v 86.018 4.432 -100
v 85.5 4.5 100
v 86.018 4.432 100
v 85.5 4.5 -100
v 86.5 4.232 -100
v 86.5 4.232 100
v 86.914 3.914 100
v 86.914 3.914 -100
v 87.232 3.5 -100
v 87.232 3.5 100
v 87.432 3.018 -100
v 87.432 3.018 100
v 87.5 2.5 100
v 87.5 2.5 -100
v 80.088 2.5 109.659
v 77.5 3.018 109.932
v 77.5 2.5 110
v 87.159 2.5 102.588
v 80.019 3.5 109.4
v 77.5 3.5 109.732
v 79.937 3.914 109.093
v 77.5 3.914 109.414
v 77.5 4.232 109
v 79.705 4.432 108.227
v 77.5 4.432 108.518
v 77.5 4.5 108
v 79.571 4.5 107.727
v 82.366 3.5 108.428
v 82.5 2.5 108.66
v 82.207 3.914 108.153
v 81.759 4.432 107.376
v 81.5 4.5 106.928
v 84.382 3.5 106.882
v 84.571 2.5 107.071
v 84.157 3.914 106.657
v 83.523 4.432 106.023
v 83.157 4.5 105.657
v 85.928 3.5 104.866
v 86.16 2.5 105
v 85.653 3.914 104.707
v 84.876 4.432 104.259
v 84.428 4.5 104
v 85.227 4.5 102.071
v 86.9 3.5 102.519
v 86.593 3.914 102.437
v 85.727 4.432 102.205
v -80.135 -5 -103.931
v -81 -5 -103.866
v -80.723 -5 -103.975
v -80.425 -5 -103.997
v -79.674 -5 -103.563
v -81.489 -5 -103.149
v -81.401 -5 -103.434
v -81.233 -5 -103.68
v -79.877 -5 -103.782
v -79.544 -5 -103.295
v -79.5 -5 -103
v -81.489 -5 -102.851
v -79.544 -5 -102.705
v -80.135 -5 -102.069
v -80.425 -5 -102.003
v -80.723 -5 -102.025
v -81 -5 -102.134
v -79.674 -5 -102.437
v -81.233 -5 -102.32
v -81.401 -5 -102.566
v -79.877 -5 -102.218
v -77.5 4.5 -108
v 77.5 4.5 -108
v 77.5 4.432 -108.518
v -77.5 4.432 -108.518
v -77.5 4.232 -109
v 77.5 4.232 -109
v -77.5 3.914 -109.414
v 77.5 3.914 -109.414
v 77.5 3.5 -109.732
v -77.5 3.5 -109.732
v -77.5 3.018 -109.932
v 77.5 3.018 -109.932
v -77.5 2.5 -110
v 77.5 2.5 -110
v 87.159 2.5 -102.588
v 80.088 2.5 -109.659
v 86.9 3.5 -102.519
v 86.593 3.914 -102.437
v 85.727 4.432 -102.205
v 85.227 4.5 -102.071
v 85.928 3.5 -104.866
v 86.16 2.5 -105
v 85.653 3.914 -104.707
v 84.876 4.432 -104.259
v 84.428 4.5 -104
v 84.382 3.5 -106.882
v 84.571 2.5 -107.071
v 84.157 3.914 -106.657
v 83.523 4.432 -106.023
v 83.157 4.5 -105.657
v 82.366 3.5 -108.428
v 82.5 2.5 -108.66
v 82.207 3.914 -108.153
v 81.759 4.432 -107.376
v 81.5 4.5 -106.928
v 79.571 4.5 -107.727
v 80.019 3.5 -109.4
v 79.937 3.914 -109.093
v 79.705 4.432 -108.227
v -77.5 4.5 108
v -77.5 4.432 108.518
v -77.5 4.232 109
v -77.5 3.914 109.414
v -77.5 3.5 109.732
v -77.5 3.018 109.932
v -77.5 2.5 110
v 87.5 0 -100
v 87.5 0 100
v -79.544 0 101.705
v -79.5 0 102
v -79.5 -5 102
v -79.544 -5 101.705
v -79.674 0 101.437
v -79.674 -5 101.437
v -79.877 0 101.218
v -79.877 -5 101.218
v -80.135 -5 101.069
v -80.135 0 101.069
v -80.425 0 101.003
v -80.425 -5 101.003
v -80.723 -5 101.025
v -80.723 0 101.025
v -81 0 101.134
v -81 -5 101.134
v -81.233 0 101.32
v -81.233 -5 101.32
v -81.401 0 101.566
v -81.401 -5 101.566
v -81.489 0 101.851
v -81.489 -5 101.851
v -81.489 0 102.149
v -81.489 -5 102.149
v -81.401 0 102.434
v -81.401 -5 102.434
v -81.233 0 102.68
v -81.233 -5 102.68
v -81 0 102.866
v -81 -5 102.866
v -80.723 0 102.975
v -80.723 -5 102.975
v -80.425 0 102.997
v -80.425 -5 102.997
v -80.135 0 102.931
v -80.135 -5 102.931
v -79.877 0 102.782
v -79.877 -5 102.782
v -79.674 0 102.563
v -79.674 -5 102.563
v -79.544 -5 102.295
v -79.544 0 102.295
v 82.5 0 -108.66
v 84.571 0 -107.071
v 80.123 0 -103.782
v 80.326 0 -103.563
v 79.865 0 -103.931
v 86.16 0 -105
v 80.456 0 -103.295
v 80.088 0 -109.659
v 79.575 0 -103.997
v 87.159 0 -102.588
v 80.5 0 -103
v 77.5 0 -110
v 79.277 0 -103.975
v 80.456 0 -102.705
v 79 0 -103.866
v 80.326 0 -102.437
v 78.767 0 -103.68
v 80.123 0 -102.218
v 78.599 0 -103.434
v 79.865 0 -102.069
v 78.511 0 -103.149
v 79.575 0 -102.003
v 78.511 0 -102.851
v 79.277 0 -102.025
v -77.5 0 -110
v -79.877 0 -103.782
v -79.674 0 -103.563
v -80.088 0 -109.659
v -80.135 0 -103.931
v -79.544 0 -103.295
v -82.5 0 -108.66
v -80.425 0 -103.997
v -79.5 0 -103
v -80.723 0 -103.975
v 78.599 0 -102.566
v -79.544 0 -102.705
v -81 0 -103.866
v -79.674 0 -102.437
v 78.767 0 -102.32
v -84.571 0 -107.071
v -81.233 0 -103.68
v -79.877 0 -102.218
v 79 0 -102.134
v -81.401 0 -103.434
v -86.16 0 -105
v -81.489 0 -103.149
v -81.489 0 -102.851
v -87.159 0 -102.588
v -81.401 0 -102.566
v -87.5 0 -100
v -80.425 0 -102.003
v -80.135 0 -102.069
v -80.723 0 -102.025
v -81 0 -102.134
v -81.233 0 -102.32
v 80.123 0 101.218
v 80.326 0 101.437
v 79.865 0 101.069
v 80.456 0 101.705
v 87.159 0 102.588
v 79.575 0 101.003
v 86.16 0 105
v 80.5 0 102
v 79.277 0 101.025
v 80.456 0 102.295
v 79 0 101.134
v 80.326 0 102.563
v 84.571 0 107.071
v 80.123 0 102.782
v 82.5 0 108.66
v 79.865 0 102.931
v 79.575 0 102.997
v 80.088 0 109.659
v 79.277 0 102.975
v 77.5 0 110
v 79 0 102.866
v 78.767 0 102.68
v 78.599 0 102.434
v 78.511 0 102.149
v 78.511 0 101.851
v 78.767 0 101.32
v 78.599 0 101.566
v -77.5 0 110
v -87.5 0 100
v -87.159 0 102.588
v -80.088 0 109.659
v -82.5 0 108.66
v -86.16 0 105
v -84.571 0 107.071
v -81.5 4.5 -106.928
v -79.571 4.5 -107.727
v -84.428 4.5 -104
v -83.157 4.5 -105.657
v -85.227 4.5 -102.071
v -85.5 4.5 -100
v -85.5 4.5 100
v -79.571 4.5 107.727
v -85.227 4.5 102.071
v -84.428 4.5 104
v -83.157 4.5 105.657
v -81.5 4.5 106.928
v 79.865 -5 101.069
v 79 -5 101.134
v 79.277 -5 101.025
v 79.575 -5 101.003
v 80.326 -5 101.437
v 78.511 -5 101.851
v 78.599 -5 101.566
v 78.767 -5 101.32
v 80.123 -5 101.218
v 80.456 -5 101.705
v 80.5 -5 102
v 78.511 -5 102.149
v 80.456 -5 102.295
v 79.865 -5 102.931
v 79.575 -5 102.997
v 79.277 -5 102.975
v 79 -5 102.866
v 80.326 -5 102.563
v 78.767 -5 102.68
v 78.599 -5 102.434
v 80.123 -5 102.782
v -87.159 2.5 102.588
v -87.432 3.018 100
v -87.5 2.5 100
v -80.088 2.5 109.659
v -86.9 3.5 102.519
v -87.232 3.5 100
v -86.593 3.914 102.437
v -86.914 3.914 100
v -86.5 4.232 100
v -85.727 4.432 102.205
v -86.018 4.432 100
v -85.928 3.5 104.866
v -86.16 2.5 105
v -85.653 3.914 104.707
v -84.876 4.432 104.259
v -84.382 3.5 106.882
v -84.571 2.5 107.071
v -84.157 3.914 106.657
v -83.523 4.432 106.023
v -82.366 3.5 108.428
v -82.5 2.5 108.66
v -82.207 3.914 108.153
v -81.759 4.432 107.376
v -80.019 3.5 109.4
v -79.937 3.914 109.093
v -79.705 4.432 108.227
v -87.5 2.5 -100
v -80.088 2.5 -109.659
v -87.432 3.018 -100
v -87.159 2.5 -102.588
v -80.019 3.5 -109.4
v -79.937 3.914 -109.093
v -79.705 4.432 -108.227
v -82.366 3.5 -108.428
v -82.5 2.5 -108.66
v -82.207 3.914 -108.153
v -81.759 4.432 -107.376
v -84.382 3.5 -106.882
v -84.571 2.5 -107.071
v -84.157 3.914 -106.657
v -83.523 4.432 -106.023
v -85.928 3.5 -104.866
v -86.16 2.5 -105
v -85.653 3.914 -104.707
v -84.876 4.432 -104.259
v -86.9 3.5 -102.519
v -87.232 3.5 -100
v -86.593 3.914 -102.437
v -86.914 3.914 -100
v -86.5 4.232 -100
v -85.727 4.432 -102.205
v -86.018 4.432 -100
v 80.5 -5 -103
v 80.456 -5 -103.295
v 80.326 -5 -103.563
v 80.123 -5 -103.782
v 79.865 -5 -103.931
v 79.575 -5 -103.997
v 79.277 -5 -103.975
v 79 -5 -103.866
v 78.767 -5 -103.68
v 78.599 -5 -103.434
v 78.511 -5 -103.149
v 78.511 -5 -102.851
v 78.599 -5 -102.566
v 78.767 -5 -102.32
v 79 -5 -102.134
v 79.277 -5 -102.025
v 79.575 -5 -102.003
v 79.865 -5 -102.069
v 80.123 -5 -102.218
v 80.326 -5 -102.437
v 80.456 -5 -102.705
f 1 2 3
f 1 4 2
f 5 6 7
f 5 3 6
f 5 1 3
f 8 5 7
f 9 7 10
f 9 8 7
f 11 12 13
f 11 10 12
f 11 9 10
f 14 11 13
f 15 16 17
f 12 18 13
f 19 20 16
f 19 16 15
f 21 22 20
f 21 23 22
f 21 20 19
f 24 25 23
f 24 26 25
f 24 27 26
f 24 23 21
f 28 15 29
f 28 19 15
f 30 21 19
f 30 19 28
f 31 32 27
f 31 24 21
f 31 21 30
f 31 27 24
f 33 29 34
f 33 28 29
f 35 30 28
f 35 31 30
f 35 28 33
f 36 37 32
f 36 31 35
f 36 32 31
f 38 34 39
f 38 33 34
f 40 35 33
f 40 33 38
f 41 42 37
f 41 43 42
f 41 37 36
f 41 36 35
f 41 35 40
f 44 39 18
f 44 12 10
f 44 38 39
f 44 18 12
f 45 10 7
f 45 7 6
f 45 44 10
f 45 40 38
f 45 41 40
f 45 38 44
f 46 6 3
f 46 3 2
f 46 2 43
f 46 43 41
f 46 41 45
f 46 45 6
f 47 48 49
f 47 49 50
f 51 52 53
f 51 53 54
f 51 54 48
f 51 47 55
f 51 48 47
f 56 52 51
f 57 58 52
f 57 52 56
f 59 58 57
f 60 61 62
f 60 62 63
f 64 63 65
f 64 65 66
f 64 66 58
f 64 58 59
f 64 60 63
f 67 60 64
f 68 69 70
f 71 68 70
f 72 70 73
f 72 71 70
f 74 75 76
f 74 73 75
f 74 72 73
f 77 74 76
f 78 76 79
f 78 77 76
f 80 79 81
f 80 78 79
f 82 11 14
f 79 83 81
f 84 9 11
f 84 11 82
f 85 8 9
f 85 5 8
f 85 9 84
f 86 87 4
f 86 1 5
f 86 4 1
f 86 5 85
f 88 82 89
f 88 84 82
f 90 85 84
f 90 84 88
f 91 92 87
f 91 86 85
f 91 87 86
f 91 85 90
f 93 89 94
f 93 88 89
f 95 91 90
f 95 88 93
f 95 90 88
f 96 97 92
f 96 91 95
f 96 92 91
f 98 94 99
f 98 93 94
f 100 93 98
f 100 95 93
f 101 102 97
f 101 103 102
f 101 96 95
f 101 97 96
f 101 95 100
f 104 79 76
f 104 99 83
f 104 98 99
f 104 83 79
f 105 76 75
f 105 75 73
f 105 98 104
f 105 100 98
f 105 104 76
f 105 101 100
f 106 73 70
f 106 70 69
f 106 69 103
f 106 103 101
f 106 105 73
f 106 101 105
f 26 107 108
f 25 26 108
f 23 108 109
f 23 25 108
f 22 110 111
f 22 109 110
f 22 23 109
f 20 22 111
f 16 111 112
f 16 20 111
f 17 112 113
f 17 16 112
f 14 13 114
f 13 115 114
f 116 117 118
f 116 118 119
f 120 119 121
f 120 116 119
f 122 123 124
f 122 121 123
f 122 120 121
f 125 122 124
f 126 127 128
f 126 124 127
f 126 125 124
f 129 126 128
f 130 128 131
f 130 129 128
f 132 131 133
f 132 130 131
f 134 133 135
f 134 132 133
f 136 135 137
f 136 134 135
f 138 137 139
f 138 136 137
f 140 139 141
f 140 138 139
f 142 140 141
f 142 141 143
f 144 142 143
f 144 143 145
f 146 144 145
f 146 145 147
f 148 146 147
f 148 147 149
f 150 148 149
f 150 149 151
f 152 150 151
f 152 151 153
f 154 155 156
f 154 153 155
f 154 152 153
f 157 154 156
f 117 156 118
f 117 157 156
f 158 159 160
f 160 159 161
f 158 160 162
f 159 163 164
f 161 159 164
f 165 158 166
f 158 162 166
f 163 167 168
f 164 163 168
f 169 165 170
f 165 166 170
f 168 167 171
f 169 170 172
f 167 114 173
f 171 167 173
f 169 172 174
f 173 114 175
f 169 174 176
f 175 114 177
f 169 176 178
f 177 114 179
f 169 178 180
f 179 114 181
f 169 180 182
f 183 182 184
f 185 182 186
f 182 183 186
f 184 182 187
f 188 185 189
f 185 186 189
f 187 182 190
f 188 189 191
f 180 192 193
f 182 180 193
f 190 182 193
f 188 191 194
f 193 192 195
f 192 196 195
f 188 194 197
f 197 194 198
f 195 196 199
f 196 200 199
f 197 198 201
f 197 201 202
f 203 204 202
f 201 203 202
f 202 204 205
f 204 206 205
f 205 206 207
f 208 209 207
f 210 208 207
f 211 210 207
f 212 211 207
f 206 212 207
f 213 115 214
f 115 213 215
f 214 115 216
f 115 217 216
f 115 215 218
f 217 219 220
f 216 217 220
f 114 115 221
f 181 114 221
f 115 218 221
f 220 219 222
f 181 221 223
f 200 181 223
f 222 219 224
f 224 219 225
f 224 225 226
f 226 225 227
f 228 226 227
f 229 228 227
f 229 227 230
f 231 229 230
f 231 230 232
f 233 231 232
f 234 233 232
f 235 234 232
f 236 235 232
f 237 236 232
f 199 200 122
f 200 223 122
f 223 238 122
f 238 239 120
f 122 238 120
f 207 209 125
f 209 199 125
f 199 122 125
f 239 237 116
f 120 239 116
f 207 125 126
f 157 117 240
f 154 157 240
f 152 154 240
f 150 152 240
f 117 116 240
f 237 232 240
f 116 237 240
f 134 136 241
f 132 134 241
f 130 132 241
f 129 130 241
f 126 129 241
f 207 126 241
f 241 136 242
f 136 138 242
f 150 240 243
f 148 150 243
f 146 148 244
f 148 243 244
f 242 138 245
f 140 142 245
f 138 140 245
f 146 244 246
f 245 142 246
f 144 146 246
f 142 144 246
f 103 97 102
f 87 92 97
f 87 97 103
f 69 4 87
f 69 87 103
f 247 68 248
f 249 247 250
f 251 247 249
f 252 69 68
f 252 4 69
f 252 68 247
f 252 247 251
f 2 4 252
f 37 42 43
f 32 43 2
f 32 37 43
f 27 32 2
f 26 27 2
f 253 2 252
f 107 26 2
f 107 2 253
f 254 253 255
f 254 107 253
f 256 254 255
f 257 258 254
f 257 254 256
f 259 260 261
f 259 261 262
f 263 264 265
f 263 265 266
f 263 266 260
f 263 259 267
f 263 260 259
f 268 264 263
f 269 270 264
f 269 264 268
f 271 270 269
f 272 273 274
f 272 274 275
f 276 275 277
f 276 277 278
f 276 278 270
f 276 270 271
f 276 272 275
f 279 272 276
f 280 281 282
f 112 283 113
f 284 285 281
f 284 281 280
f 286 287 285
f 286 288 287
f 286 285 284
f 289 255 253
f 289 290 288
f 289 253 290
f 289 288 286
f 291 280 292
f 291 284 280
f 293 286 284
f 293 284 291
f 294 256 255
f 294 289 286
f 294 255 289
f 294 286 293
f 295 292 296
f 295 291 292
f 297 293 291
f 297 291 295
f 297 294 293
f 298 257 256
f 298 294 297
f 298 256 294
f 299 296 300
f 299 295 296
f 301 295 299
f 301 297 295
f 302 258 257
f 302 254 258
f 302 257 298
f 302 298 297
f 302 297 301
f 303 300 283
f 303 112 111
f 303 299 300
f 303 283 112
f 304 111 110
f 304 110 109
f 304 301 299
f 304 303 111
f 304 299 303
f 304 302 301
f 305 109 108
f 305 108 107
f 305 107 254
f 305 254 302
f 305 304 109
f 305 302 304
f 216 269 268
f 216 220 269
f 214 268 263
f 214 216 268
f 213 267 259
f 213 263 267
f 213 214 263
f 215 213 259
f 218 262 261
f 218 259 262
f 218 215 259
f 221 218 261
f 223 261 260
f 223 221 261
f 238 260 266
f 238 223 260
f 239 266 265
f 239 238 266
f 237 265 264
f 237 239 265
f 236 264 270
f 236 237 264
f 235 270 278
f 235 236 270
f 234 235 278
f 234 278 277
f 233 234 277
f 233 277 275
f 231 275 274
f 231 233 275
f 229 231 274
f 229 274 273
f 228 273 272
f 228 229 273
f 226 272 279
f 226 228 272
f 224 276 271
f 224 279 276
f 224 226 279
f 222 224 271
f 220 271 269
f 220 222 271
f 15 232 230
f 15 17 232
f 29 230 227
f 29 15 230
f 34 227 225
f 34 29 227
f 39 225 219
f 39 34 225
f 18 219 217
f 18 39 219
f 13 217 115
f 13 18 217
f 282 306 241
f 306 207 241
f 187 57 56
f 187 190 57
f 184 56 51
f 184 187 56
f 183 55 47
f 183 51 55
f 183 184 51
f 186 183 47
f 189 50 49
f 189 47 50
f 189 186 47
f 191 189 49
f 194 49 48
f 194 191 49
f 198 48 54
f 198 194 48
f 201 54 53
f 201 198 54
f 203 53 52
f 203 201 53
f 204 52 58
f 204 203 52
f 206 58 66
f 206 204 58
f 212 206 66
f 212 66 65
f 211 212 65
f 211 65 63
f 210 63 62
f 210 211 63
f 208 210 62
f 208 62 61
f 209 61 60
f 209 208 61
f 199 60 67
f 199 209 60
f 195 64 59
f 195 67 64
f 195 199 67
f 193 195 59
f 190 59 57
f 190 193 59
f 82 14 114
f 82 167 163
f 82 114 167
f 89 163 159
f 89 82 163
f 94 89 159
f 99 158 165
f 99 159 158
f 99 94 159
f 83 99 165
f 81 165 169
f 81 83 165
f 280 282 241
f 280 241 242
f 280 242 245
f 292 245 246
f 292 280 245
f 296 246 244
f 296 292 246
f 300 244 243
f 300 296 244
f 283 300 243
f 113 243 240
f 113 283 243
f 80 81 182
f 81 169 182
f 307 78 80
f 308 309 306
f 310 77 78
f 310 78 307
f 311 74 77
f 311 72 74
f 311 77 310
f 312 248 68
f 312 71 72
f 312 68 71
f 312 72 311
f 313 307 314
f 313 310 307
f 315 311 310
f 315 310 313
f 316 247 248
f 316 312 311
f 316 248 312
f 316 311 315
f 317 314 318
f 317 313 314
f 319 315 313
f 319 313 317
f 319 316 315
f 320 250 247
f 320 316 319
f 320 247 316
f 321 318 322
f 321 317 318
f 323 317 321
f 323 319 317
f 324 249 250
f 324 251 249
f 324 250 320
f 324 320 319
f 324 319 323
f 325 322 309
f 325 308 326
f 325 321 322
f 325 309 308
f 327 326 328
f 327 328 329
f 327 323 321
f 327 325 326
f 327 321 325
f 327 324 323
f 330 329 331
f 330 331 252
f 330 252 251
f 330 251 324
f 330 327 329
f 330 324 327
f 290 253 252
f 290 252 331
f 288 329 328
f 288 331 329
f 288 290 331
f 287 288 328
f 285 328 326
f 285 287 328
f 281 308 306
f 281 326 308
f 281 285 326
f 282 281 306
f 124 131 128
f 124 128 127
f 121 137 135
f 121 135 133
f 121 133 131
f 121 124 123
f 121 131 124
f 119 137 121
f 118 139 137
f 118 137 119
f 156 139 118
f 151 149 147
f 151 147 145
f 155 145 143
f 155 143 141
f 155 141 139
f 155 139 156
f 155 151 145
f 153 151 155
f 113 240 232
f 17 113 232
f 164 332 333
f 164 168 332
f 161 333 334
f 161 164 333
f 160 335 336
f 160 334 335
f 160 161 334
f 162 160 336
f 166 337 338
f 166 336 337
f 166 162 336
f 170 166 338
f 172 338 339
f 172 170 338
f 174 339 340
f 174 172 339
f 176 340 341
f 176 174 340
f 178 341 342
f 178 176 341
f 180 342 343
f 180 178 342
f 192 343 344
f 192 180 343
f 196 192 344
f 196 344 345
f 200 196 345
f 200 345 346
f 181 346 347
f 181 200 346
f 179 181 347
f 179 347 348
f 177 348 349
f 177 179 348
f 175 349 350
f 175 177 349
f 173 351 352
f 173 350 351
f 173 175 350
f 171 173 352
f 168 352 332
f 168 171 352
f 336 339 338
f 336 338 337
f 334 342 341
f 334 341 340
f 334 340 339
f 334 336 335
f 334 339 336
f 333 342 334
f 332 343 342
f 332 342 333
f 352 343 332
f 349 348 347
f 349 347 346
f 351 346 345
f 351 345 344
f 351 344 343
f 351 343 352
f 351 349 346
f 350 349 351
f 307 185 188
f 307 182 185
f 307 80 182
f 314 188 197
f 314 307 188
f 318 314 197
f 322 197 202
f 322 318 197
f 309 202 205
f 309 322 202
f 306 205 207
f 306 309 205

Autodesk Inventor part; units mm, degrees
ref_plane "YZ Plane" through (0, 0, 0) normal (1, 0, 0) x (0, 1, 0)
ref_plane "XZ Plane" through (0, 0, 0) normal (0, 1, 0) x (-1, 0, 0)
ref_plane "XY Plane" through (0, 0, 0) normal (0, 0, 1) x (1, 0, 0)
sketch "Sketch1" plane through (0, 0, 0) normal (0, 1, 0) x (-1, 0, 0)
  line L0 (87.5, 110) -> (-87.5, 110)
  line L1 (-87.5, 110) -> (-87.5, -110)
  line L2 (-87.5, -110) -> (87.5, -110)
  line L3 (87.5, -110) -> (87.5, 110)
  point P0 (0, 0)
  dimension "d0" = 110
  dimension "d1" = 110
  dimension "d2" = 87.5
  dimension "d3" = 87.5
extrude "Extrusion1" add sketch "Sketch1" along normal blind 4.5
fillet "Fillet1" radius 10 4 edges at (-87.5, 2.25, 110) (-87.5, 2.25, -110) (87.5, 2.25, -110) (87.5, 2.25, 110)
fillet "Fillet2" radius 2 8 edges at (-84.5711, 4.5, 107.0711) (0, 4.5, 110) (84.5711, 4.5, 107.0711) (87.5, 4.5, 0) (84.5711, 4.5, -107.0711) (0, 4.5, -110) (-84.5711, 4.5, -107.0711) (-87.5, 4.5, 0)
sketch "Sketch2" plane through (0, 0, 0) normal (0, -1, 0) x (1, 0, 0)
  circle A0 centre (-80.5, -103) radius 1
  line L0 (77.5, -110) -> (-77.5, -110) projected
  line L1 (-87.5, -100) -> (-87.5, 100) projected
  circle A1 centre (79.5, -103) radius 1
  circle A2 centre (-80.5, 102) radius 1
  circle A3 centre (79.5, 102) radius 1
  point P0 (0, 0)
  dimension "d8" = 7
  dimension "d9" = 7
  dimension "d10" = 2
  dimension "d13" = 160
  dimension "d16" = 205
extrude "Extrusion2" add sketch "Sketch2" along normal blind 5
sketch "Sketch4" plane through (0, 4.5, 0) normal (0, 1, 0) x (1, 0, 0)
  line L0 (88.4576, 110.604) -> (88.4576, -111.3884) construction
  line L1 (88.4576, -111.3884) -> (-87.9776, -111.3884) construction
  line L2 (-87.9776, -111.3884) -> (-87.9776, 110.604) construction
  line L3 (-87.9776, 110.604) -> (88.4576, 110.604) construction
  point P0 (0, 0)
decal "Decal1"
decal "Decal2"
decal "Decal3"
decal "Decal4"
decal "Decal5"
decal "Decal6"
decal "Decal7"
decal "Decal8"
decal "Decal9"
equation "\"d1\" = d0"
equation "\"d3\" = d2"
properties part number "Solar Panel"
